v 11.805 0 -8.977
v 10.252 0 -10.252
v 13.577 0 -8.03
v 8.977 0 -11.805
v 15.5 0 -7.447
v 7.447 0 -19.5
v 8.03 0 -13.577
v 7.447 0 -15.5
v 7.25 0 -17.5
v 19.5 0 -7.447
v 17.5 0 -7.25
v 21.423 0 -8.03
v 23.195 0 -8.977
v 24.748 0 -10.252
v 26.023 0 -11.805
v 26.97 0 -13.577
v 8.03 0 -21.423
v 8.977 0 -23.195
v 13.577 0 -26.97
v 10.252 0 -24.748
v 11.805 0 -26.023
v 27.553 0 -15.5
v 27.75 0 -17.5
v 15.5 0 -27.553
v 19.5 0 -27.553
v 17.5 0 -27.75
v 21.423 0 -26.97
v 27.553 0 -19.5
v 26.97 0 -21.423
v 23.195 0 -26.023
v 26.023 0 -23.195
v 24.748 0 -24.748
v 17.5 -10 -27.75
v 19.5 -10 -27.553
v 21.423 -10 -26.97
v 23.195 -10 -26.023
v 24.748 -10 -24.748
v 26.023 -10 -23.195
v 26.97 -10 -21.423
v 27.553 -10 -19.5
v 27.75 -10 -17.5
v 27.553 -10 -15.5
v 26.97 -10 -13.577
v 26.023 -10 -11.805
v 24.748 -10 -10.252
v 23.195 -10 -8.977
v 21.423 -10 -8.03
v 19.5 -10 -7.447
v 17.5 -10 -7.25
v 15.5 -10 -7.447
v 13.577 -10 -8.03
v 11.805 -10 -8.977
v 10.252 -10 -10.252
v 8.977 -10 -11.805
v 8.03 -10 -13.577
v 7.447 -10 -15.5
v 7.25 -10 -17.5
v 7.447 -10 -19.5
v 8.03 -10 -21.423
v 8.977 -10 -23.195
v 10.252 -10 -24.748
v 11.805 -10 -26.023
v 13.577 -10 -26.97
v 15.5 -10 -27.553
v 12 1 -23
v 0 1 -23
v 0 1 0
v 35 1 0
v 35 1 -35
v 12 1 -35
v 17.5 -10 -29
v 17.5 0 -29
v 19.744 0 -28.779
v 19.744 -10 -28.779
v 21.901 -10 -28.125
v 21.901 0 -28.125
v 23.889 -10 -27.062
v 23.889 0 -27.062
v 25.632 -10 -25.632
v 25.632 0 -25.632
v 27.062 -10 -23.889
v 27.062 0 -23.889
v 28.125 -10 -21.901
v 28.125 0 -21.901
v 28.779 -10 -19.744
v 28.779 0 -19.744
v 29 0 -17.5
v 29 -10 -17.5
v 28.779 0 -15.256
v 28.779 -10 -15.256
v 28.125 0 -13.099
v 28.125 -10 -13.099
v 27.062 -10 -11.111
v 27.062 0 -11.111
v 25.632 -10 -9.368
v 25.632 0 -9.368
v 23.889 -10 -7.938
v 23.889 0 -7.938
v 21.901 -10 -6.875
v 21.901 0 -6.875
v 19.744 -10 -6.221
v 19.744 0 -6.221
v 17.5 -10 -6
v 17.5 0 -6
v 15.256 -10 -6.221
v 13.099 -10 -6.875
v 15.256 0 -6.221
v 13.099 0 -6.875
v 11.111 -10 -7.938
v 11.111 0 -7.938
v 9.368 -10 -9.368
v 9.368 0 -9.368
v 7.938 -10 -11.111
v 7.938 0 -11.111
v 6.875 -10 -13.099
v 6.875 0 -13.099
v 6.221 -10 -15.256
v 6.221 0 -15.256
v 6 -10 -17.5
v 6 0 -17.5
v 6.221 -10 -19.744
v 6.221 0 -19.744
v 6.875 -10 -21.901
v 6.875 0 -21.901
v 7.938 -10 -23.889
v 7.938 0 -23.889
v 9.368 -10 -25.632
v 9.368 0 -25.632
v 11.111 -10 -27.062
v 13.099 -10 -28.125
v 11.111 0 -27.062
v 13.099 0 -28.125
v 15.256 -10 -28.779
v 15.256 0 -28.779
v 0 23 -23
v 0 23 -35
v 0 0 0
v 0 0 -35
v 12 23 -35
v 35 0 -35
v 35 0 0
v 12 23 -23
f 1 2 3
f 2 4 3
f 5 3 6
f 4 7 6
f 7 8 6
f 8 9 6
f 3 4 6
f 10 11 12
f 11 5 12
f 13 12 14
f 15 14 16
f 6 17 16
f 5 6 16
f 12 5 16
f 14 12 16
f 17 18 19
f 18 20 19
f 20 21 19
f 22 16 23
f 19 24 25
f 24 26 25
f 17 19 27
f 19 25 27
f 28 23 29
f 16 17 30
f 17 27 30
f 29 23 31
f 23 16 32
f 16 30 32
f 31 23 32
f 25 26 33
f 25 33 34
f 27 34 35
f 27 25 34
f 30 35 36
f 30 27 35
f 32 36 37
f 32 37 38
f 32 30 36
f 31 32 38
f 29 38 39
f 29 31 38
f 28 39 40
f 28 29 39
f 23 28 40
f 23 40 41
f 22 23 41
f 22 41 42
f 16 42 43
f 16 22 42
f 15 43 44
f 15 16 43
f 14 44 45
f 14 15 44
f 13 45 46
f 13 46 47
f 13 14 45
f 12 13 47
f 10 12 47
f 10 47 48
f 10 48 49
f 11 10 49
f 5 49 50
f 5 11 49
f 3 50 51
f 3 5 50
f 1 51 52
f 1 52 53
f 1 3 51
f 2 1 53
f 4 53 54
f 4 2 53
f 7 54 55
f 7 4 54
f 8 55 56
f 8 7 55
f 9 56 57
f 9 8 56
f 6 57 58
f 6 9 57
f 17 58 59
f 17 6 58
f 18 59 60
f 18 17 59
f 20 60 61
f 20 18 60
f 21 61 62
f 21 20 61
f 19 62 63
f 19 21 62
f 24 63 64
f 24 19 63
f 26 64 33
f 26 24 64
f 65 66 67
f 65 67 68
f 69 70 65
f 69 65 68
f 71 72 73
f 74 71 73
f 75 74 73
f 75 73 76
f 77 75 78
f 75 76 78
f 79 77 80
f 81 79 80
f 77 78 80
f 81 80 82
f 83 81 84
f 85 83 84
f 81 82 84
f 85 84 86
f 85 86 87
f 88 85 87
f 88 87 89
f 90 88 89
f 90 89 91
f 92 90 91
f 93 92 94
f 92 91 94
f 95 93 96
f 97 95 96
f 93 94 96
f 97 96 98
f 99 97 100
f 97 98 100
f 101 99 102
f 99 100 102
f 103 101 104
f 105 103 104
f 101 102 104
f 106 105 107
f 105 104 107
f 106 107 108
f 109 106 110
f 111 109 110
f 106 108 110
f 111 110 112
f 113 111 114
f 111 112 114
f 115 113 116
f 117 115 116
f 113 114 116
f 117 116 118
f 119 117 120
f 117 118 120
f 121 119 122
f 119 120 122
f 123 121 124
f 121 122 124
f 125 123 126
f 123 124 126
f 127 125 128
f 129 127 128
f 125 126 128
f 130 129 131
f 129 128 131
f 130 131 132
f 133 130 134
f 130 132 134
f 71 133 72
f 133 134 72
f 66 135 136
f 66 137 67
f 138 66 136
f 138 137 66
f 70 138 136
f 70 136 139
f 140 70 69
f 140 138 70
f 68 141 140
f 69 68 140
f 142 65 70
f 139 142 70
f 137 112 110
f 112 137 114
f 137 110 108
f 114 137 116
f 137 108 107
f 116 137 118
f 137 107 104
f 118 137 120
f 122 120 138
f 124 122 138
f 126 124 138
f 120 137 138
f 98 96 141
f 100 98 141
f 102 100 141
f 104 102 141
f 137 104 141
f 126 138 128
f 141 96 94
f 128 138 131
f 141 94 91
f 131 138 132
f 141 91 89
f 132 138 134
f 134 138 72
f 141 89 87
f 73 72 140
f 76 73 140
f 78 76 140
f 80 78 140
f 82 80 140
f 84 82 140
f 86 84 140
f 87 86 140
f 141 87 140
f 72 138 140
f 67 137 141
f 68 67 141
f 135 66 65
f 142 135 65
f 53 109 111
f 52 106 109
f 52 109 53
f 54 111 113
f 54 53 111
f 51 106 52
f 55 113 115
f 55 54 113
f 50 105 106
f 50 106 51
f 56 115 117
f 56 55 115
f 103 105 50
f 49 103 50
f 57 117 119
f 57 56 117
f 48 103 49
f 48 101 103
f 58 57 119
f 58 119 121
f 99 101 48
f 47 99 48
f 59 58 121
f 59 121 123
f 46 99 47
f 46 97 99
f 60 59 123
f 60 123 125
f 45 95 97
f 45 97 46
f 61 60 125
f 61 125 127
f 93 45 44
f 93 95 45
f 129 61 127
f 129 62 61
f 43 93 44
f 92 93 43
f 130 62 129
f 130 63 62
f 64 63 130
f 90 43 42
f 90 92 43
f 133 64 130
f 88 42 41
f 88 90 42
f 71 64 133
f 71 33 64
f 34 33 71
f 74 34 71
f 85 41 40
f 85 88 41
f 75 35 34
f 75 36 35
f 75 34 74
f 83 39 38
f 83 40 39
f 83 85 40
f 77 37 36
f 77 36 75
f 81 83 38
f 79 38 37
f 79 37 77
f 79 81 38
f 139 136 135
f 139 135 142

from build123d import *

# Parameters (mm, degrees)
SKETCH1_W           = 35
SKETCH1_H           = 35
BOSS_EXTRUDE1_DEPTH = 1
SKETCH2_W           = 12
SKETCH2_H           = 12
BOSS_EXTRUDE2_DEPTH = 22
SKETCH3_R           = 11.5
SKETCH3_R_2         = 10.25
BOSS_EXTRUDE3_DEPTH = 10


with BuildPart() as part:
    # Sketch1 → Boss-Extrude1 (new body)
    with BuildSketch(Plane(origin=(0, 0, 0), x_dir=(1, 0, 0), z_dir=(0, 1, 0))):
        with Locations((17.5, 17.5)):
            Rectangle(SKETCH1_W, SKETCH1_H)
    extrude(amount=BOSS_EXTRUDE1_DEPTH)

    # Sketch2 → Boss-Extrude2 (add)
    with BuildSketch(Plane(origin=(0, 1, 0), x_dir=(1, 0, 0), z_dir=(0, 1, 0))):
        with Locations((6, 29)):
            Rectangle(SKETCH2_W, SKETCH2_H)
    extrude(amount=BOSS_EXTRUDE2_DEPTH)

    # Sketch3 → Boss-Extrude3 (add)
    with BuildSketch(Plane.XZ):
        with Locations(Location((17.5, -17.5, 0), (0, 0, 270))):
            Circle(SKETCH3_R)
        with Locations(Location((17.5, -17.5, 0), (0, 0, 270))):
            Circle(SKETCH3_R_2, mode=Mode.SUBTRACT)
    extrude(amount=BOSS_EXTRUDE3_DEPTH)


solid = part.part
